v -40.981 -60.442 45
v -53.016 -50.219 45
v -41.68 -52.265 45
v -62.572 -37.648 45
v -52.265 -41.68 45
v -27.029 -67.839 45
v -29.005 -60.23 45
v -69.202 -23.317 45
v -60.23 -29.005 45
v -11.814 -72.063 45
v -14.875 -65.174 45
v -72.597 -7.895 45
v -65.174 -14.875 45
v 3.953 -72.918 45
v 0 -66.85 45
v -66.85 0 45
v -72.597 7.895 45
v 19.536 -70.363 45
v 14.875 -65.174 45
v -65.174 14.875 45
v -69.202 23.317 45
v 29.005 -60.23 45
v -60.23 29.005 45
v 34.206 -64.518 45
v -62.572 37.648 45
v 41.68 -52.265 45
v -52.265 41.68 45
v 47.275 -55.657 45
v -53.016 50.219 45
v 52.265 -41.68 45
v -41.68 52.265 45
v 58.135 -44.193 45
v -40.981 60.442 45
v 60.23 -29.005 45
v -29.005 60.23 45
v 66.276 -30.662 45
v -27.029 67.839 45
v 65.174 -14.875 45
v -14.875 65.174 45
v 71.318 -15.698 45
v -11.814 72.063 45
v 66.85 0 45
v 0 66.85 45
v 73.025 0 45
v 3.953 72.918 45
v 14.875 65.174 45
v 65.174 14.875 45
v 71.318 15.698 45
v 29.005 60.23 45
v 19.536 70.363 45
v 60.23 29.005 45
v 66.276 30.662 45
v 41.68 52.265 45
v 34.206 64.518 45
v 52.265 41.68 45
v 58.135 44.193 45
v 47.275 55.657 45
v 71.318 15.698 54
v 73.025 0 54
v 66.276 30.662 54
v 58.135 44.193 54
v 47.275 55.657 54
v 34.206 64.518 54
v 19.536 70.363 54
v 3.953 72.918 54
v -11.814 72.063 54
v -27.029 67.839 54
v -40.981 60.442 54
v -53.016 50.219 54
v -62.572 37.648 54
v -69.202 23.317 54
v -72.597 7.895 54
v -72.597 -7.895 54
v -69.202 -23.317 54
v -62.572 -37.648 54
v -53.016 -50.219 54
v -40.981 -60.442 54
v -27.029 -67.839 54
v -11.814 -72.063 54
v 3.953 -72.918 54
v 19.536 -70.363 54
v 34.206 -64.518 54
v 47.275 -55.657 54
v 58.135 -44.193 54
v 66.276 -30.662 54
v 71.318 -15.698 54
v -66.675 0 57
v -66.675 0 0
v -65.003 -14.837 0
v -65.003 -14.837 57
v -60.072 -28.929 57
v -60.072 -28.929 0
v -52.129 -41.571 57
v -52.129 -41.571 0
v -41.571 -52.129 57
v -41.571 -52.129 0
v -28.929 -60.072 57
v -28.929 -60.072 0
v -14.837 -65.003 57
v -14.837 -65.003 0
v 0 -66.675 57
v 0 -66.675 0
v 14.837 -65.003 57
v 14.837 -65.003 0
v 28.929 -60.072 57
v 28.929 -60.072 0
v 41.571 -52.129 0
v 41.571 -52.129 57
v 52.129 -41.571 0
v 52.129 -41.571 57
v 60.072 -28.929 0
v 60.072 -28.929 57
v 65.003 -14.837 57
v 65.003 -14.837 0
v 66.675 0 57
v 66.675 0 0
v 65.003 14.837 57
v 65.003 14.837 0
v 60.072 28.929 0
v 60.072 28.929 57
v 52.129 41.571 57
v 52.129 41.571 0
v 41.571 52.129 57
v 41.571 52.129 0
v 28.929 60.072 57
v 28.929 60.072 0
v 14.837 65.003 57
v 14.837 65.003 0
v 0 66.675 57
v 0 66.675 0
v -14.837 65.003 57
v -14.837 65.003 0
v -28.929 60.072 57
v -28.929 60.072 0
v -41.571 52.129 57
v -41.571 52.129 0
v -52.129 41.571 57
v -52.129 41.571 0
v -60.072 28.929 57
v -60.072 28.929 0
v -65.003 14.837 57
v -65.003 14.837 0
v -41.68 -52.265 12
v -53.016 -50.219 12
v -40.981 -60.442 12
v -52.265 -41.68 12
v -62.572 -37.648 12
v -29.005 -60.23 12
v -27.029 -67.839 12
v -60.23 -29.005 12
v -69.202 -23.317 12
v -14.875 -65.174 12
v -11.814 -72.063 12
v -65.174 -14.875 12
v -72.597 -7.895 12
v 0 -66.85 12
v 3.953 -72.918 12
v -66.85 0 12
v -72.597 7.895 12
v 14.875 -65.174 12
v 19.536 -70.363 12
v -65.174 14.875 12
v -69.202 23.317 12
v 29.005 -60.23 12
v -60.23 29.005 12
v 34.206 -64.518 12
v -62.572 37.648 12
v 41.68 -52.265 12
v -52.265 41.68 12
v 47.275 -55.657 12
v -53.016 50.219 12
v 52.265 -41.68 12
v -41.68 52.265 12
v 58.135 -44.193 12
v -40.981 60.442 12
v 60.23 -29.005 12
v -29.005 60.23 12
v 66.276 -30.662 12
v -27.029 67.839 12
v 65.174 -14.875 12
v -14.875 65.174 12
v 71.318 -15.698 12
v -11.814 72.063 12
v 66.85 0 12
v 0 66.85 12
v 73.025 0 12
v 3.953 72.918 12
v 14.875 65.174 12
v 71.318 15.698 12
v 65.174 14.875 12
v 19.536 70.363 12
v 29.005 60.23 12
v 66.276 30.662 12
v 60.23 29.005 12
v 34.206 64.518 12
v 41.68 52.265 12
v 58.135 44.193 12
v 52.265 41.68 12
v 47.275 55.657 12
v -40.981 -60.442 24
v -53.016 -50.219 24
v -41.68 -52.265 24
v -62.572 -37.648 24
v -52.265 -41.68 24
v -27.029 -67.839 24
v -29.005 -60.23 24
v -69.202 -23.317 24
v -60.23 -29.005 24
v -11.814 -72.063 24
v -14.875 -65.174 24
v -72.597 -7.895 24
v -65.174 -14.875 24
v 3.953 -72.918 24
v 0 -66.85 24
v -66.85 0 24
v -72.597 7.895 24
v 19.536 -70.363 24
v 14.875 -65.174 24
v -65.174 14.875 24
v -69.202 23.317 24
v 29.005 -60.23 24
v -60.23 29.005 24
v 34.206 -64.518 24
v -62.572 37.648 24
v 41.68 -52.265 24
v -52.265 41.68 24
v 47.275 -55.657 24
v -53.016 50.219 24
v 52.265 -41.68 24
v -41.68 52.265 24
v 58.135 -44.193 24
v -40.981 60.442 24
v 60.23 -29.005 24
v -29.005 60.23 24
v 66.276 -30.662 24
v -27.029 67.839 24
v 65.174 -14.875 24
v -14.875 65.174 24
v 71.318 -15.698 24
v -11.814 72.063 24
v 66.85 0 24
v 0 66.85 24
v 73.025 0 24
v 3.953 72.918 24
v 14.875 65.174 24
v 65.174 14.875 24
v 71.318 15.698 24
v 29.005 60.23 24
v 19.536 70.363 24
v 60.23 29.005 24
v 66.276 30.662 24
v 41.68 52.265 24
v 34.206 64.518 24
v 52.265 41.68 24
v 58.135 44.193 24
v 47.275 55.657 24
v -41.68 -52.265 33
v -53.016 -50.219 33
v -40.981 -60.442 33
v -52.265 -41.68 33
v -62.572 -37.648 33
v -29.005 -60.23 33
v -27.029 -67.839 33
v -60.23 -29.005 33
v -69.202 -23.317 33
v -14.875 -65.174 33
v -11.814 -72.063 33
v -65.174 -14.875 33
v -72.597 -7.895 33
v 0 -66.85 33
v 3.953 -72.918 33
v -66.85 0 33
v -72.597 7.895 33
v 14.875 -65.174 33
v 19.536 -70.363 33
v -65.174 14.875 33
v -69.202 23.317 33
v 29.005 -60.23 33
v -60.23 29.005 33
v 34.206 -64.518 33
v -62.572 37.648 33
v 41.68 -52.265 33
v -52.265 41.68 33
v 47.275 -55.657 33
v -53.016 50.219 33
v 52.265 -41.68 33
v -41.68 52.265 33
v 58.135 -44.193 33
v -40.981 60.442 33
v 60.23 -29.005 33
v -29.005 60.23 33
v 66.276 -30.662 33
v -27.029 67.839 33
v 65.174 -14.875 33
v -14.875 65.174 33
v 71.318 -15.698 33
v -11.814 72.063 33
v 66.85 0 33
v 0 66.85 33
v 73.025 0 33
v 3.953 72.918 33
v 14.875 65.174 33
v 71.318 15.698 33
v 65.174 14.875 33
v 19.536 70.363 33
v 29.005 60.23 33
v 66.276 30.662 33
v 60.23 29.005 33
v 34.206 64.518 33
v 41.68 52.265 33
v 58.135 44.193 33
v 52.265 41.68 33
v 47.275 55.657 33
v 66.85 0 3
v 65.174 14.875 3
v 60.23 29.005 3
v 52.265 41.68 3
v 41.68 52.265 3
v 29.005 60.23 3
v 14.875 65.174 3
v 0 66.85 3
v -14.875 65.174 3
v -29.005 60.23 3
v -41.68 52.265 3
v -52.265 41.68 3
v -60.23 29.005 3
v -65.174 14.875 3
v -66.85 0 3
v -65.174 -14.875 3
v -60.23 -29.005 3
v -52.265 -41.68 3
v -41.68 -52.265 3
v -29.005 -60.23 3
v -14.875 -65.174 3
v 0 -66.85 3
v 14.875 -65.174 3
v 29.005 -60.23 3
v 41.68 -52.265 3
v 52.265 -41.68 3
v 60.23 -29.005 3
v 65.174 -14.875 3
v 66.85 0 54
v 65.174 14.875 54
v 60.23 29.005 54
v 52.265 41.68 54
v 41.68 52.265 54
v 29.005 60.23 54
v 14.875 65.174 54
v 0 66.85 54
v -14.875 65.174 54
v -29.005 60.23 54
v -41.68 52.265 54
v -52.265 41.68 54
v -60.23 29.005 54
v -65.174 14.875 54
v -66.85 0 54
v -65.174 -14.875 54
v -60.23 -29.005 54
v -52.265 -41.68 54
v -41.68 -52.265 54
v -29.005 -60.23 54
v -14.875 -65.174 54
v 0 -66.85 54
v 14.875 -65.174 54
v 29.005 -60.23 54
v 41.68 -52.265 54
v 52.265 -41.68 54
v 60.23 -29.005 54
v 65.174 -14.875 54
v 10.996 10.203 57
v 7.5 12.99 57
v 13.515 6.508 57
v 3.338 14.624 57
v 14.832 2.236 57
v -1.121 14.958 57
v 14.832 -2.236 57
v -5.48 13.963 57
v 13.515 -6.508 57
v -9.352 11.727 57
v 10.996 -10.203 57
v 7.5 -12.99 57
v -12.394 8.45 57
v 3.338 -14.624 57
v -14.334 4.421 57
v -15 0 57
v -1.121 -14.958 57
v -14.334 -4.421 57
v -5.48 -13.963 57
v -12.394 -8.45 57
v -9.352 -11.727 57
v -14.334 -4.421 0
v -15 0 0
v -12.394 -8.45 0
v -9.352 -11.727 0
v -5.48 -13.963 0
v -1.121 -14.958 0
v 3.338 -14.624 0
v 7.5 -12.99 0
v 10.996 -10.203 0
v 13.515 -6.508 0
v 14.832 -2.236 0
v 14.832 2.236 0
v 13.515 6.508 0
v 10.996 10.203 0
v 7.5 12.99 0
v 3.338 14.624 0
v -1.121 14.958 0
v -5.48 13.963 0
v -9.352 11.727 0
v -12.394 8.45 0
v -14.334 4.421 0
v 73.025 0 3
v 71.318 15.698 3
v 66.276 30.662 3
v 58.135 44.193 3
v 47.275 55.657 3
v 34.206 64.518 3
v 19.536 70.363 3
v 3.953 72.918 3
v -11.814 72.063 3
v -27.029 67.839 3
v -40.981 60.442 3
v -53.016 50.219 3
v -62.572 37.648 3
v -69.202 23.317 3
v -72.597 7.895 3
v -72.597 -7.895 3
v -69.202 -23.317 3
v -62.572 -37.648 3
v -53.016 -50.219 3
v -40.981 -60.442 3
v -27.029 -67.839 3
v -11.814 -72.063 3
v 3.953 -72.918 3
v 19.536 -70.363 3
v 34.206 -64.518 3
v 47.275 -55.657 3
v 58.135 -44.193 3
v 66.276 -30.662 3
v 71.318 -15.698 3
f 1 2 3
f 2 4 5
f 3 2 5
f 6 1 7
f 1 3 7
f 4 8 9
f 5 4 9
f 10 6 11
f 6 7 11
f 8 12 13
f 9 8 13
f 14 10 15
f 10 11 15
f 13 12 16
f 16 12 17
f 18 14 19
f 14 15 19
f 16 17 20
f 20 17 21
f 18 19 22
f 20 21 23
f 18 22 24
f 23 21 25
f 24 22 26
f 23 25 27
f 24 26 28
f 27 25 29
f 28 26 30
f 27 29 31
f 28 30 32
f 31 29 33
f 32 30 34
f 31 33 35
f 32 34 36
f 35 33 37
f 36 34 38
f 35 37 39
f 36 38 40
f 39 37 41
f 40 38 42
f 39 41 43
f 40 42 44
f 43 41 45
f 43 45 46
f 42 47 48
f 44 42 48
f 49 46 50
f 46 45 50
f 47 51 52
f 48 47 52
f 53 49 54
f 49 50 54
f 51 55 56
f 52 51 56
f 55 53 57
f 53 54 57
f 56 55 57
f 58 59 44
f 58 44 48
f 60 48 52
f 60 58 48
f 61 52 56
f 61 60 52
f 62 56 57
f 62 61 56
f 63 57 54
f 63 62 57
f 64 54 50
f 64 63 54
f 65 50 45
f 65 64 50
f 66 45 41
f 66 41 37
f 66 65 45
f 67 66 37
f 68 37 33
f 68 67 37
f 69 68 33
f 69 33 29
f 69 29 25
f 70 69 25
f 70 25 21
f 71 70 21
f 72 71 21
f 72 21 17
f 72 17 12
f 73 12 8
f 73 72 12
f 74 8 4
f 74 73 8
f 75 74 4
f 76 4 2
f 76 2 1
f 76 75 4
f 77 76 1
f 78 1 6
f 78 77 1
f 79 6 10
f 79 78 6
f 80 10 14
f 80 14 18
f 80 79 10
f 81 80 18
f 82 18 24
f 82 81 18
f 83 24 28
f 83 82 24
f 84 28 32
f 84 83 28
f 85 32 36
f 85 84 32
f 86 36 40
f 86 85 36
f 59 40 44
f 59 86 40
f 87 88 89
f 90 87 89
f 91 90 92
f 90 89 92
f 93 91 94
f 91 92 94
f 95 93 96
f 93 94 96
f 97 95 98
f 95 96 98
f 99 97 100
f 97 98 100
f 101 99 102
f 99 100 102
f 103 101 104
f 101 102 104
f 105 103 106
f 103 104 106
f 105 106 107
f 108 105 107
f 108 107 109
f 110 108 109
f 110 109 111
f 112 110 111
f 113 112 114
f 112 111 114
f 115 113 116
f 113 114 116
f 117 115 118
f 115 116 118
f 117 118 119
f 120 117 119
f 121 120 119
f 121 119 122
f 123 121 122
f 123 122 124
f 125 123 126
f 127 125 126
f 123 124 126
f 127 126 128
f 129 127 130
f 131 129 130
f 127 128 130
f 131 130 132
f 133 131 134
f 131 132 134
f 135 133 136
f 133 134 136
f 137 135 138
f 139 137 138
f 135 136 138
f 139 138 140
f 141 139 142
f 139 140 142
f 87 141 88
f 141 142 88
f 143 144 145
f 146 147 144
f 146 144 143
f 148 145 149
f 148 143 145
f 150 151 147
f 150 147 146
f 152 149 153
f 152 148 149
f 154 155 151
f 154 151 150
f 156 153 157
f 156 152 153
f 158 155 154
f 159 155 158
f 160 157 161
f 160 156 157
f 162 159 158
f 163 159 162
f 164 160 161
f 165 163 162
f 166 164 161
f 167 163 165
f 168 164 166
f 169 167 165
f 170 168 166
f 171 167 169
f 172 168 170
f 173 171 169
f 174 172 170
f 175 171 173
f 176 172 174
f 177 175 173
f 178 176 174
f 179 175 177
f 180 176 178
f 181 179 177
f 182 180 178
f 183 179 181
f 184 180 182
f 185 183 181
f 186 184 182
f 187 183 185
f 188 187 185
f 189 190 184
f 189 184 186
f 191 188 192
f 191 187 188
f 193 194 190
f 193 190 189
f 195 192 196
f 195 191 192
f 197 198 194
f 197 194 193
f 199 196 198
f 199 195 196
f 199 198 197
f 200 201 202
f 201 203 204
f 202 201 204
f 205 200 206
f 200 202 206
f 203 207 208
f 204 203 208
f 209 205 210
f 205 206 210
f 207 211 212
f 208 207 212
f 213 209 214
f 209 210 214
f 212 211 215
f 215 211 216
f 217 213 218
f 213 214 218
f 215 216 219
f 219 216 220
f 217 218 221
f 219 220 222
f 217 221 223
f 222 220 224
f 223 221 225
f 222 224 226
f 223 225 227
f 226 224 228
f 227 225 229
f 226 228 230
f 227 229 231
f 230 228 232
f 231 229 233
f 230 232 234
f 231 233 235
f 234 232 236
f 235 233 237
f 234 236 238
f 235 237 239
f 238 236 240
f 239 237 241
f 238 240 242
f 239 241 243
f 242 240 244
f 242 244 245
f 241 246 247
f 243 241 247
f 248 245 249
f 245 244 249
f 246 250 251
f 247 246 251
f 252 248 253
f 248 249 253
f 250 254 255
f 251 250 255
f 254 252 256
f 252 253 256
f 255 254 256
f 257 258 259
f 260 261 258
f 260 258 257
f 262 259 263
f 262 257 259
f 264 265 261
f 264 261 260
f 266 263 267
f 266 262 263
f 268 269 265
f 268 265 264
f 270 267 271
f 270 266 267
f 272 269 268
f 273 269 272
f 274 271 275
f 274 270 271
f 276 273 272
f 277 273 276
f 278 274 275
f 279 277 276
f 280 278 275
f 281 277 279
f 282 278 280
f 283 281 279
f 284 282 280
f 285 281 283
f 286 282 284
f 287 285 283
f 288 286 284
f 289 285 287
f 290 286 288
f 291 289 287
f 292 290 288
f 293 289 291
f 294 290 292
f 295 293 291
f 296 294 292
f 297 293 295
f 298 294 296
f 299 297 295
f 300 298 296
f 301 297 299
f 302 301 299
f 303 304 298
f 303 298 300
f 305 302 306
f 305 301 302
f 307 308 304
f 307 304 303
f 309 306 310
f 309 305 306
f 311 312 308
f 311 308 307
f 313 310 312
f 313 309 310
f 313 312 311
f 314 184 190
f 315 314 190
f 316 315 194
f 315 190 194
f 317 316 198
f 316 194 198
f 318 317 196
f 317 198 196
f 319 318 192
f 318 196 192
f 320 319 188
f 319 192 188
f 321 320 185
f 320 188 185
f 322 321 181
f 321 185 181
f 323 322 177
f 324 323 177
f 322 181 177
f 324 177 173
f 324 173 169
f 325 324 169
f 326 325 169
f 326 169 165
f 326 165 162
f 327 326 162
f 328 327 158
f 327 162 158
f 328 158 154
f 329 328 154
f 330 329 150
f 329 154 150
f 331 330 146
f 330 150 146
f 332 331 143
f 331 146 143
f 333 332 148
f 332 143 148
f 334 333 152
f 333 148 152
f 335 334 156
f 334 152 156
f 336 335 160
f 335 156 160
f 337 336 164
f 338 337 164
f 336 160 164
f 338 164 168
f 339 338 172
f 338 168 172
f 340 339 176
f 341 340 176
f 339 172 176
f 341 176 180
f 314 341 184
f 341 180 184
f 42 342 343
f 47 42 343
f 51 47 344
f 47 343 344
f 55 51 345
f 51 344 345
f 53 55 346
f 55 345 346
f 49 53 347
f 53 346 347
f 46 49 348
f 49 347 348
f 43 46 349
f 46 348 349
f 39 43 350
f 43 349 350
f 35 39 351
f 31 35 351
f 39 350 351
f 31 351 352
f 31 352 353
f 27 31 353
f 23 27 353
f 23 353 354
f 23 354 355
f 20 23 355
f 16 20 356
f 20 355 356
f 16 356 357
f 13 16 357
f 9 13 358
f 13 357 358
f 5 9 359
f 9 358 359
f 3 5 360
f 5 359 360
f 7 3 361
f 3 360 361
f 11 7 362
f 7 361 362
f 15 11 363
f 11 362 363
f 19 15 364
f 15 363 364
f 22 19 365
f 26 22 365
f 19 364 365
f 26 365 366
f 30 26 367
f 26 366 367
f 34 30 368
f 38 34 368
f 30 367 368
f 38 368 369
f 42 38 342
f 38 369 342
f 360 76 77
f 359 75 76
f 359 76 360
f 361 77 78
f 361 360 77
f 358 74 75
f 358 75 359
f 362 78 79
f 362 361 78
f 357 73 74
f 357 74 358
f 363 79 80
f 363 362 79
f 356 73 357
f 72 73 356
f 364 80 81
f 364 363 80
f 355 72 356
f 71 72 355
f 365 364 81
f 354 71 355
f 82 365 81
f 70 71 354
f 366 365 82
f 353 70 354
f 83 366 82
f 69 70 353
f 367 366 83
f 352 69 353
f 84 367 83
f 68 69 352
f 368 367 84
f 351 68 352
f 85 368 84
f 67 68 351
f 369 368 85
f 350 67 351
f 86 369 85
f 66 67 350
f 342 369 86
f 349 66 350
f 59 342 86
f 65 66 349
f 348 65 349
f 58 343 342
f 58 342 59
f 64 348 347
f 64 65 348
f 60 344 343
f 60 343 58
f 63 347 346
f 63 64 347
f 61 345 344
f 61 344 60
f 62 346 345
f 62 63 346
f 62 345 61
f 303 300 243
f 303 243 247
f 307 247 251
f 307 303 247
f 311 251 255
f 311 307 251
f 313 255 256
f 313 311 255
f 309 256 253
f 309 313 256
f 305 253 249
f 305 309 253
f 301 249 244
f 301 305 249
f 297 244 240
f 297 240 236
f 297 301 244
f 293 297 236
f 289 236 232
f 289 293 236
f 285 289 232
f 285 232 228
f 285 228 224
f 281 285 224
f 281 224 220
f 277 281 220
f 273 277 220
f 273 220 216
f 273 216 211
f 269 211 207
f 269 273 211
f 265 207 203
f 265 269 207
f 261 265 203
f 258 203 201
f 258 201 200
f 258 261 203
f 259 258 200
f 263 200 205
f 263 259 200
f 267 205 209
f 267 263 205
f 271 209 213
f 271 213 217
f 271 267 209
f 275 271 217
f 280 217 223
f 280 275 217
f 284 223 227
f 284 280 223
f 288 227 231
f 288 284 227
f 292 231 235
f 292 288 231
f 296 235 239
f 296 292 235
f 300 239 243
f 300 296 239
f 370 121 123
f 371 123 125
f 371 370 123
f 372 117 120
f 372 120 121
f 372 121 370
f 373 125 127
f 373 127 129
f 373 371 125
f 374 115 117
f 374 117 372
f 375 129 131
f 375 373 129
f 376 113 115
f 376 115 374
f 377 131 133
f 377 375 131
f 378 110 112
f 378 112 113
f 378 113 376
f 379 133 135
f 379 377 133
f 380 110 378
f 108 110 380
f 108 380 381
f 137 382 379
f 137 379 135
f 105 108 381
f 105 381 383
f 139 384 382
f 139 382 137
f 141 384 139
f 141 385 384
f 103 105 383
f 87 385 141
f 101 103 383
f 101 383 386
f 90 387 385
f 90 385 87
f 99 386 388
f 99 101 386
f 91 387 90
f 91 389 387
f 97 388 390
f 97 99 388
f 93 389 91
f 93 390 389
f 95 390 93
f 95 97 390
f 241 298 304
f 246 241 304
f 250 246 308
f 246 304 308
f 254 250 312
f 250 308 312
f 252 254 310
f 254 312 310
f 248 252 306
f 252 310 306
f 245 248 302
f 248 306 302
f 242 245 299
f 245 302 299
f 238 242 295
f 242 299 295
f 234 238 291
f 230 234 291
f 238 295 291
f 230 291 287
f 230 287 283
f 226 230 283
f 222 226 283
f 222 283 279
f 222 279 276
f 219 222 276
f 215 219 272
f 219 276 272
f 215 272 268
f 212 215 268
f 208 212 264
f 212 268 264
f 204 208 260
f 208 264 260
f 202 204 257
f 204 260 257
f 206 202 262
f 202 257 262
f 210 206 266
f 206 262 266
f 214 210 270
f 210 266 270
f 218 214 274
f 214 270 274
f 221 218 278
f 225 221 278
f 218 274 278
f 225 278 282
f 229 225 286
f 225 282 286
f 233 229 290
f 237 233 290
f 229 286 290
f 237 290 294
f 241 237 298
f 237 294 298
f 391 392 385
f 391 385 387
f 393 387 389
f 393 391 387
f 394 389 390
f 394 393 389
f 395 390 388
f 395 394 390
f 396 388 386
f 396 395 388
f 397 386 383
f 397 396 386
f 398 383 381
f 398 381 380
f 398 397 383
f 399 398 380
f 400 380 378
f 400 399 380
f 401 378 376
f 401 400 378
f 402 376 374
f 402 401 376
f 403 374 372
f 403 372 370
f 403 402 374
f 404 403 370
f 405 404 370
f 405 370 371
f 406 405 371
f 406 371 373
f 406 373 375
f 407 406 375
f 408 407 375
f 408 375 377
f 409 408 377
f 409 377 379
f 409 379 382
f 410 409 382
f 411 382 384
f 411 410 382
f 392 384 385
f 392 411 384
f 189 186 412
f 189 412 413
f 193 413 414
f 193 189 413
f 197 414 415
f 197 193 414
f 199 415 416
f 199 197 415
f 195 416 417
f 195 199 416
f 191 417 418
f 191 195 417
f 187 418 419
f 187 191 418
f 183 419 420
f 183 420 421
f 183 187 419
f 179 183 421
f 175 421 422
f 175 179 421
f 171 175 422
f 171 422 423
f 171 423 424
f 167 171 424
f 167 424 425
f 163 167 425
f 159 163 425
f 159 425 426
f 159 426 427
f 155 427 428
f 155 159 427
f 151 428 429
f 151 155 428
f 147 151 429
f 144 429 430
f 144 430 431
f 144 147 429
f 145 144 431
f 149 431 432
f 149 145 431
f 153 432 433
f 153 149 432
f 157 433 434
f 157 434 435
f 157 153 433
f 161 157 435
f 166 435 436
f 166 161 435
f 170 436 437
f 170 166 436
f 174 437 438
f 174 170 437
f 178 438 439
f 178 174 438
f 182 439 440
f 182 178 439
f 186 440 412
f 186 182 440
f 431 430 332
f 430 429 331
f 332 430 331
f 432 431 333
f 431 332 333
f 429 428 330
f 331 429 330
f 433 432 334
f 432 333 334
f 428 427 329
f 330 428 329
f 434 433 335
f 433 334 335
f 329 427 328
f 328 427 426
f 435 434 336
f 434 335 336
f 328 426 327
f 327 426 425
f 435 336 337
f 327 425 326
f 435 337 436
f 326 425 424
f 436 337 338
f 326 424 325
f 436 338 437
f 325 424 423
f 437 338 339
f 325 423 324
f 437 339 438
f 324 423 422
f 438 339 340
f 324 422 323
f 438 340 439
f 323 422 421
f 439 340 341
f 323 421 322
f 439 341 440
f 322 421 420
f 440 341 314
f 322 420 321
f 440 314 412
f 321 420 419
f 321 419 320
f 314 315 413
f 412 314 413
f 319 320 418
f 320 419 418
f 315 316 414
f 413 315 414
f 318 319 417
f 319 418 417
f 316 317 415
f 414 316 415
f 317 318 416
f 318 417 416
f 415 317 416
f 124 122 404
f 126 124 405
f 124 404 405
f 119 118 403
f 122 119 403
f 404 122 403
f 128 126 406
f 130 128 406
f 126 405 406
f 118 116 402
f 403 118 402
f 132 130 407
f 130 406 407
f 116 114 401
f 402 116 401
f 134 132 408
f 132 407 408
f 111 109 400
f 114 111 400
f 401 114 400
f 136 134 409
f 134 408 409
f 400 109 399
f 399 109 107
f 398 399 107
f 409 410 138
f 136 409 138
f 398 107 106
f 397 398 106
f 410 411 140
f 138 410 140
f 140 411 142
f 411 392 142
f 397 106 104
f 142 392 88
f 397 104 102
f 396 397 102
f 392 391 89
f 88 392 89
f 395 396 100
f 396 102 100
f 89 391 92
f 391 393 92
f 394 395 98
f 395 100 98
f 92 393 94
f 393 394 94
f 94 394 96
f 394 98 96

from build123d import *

# Parameters (mm, degrees)
SKETCH1_R           = 66.675
SKETCH1_R_2         = 15
BOSS_EXTRUDE1_DEPTH = 57
SKETCH2_R           = 73.025
SKETCH2_R_2         = 66.849881893
BOSS_EXTRUDE2_DEPTH = 9
LPATTERN1_COUNT     = 3
LPATTERN1_PITCH     = 21


with BuildPart() as part:
    # Sketch1 → Boss-Extrude1 (new body)
    with BuildSketch(Plane.XY):
        Circle(SKETCH1_R)
        Circle(SKETCH1_R_2, mode=Mode.SUBTRACT)
    extrude(amount=BOSS_EXTRUDE1_DEPTH)


with BuildPart() as body_2:
    # Sketch2 → Boss-Extrude2 (new body)
    with BuildSketch(Plane.XY.offset(54)):
        Circle(SKETCH2_R)
        Circle(SKETCH2_R_2, mode=Mode.SUBTRACT)
    boss_extrude2 = extrude(amount=-BOSS_EXTRUDE2_DEPTH)


with BuildPart() as lpattern1_1:
    # LPattern1: Boss-Extrude2 ×3
    with Locations(*[(0, 0, -i * LPATTERN1_PITCH) for i in range(1, LPATTERN1_COUNT)]):
        add(boss_extrude2)


solid = Compound([part.part, body_2.part, lpattern1_1.part])
